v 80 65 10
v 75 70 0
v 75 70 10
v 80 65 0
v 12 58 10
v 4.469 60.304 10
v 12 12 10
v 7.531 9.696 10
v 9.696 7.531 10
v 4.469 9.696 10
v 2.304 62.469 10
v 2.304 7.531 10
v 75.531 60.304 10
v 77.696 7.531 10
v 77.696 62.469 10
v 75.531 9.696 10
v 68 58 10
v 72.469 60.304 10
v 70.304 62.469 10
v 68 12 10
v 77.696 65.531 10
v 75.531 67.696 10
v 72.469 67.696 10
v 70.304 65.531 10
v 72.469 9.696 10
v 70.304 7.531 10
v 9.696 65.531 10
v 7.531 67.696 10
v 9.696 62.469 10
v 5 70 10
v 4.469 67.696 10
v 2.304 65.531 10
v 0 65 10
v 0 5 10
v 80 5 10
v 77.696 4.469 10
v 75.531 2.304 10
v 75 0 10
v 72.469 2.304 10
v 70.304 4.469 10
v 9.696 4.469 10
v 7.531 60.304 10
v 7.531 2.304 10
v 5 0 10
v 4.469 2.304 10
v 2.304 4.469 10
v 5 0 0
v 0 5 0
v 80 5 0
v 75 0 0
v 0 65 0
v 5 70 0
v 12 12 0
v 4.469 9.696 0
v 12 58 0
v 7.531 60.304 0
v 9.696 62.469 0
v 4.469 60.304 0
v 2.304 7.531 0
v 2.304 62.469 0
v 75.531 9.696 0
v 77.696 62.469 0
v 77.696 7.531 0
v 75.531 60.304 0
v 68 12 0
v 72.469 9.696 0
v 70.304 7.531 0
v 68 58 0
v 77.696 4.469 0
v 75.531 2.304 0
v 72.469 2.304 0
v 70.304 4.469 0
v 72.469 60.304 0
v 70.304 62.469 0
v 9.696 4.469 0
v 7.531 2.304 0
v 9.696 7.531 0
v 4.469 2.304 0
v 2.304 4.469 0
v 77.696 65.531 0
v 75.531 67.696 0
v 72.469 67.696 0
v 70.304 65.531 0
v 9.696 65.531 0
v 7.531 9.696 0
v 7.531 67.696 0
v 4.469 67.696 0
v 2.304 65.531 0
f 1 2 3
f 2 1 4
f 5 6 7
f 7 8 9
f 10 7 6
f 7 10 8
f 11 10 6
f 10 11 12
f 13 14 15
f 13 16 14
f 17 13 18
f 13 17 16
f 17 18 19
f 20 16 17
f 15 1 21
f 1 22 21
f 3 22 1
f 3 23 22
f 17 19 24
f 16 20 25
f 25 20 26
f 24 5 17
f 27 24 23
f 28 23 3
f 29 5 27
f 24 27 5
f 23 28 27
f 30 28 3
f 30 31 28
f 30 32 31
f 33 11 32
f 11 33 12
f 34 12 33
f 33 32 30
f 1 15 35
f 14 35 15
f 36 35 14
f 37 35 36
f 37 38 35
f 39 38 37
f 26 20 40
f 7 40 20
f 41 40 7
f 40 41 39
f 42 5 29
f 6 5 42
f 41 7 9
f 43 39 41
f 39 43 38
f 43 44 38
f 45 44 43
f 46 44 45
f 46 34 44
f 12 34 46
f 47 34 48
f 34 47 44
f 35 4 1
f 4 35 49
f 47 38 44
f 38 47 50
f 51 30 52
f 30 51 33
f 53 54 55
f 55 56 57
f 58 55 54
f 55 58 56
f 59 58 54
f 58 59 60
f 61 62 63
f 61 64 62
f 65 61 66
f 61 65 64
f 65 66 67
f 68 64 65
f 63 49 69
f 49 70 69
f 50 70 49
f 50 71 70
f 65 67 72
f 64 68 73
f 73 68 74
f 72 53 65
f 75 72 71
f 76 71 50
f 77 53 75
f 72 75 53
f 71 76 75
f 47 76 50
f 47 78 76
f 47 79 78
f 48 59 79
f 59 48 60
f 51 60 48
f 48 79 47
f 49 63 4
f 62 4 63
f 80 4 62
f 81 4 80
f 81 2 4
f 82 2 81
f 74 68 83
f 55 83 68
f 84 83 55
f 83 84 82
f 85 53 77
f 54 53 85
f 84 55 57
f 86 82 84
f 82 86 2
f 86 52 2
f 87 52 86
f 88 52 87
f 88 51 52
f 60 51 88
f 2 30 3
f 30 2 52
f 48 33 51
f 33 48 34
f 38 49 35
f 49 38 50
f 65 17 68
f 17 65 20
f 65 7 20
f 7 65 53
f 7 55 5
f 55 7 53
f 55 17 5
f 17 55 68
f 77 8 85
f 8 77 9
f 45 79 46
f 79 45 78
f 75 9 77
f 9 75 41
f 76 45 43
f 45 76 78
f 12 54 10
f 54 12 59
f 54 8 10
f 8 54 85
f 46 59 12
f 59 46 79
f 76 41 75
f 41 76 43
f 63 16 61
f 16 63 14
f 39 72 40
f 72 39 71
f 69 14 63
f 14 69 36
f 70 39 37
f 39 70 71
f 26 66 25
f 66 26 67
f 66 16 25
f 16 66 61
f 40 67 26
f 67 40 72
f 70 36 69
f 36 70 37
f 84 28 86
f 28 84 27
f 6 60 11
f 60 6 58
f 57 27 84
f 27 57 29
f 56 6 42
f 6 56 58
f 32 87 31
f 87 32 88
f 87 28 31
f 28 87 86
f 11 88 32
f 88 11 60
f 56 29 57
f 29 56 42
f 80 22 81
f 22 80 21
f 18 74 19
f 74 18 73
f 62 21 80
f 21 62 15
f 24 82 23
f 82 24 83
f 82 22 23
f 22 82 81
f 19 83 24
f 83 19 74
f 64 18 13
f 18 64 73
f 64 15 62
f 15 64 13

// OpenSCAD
$fn = 32;

// ----------------------------------------------------------------------
// Frame plate: 80 x 70 frame, 12 mm rails
// ----------------------------------------------------------------------

// --- parameters (mm) ---
plate_l = 80;             // plate length, X
plate_w = 70;             // plate width, Y
plate_t = 10;             // plate thickness, Z (extrusion height)
corner_c = 5;             // corner chamfer
frame_bar = 12;           // frame rail width
bolt_r = 4;               // corner bolt window radius
bolt_inset = 6;           // bolt centre inset from the edges

win_l = plate_l - 2 * frame_bar;  // window length
win_w = plate_w - 2 * frame_bar;  // window width
bolt_d = 2 * bolt_r;  // corner hole diameter

profile = [[5, 0], [75, 0], [80, 5], [80, 65], [75, 70], [5, 70], [0, 65], [0, 5]];  // primary outline, 8 points, counter clockwise
void_1 = [[12, 12], [68, 12], [68, 58], [12, 58]];  // the window, 4 points
void_2 = [[9.696, 7.531], [7.531, 9.696], [4.469, 9.696], [2.304, 7.531], [2.304, 4.469], [4.469, 2.304], [7.531, 2.304], [9.696, 4.469]];  // corner bolt window, 8 points
void_3 = [[77.696, 7.531], [75.531, 9.696], [72.469, 9.696], [70.304, 7.531], [70.304, 4.469], [72.469, 2.304], [75.531, 2.304], [77.696, 4.469]];  // corner bolt window, 8 points
void_4 = [[9.696, 65.531], [7.531, 67.696], [4.469, 67.696], [2.304, 65.531], [2.304, 62.469], [4.469, 60.304], [7.531, 60.304], [9.696, 62.469]];  // corner bolt window, 8 points
void_5 = [[77.696, 65.531], [75.531, 67.696], [72.469, 67.696], [70.304, 65.531], [70.304, 62.469], [72.469, 60.304], [75.531, 60.304], [77.696, 62.469]];  // corner bolt window, 8 points

// --- the one profile operation ---
difference() {
  linear_extrude(height = plate_t) polygon(points = profile);
  translate([0, 0, -1])
    linear_extrude(height = plate_t + 2) polygon(points = void_1);
  translate([0, 0, -1])
    linear_extrude(height = plate_t + 2) polygon(points = void_2);
  translate([0, 0, -1])
    linear_extrude(height = plate_t + 2) polygon(points = void_3);
  translate([0, 0, -1])
    linear_extrude(height = plate_t + 2) polygon(points = void_4);
  translate([0, 0, -1])
    linear_extrude(height = plate_t + 2) polygon(points = void_5);
}
